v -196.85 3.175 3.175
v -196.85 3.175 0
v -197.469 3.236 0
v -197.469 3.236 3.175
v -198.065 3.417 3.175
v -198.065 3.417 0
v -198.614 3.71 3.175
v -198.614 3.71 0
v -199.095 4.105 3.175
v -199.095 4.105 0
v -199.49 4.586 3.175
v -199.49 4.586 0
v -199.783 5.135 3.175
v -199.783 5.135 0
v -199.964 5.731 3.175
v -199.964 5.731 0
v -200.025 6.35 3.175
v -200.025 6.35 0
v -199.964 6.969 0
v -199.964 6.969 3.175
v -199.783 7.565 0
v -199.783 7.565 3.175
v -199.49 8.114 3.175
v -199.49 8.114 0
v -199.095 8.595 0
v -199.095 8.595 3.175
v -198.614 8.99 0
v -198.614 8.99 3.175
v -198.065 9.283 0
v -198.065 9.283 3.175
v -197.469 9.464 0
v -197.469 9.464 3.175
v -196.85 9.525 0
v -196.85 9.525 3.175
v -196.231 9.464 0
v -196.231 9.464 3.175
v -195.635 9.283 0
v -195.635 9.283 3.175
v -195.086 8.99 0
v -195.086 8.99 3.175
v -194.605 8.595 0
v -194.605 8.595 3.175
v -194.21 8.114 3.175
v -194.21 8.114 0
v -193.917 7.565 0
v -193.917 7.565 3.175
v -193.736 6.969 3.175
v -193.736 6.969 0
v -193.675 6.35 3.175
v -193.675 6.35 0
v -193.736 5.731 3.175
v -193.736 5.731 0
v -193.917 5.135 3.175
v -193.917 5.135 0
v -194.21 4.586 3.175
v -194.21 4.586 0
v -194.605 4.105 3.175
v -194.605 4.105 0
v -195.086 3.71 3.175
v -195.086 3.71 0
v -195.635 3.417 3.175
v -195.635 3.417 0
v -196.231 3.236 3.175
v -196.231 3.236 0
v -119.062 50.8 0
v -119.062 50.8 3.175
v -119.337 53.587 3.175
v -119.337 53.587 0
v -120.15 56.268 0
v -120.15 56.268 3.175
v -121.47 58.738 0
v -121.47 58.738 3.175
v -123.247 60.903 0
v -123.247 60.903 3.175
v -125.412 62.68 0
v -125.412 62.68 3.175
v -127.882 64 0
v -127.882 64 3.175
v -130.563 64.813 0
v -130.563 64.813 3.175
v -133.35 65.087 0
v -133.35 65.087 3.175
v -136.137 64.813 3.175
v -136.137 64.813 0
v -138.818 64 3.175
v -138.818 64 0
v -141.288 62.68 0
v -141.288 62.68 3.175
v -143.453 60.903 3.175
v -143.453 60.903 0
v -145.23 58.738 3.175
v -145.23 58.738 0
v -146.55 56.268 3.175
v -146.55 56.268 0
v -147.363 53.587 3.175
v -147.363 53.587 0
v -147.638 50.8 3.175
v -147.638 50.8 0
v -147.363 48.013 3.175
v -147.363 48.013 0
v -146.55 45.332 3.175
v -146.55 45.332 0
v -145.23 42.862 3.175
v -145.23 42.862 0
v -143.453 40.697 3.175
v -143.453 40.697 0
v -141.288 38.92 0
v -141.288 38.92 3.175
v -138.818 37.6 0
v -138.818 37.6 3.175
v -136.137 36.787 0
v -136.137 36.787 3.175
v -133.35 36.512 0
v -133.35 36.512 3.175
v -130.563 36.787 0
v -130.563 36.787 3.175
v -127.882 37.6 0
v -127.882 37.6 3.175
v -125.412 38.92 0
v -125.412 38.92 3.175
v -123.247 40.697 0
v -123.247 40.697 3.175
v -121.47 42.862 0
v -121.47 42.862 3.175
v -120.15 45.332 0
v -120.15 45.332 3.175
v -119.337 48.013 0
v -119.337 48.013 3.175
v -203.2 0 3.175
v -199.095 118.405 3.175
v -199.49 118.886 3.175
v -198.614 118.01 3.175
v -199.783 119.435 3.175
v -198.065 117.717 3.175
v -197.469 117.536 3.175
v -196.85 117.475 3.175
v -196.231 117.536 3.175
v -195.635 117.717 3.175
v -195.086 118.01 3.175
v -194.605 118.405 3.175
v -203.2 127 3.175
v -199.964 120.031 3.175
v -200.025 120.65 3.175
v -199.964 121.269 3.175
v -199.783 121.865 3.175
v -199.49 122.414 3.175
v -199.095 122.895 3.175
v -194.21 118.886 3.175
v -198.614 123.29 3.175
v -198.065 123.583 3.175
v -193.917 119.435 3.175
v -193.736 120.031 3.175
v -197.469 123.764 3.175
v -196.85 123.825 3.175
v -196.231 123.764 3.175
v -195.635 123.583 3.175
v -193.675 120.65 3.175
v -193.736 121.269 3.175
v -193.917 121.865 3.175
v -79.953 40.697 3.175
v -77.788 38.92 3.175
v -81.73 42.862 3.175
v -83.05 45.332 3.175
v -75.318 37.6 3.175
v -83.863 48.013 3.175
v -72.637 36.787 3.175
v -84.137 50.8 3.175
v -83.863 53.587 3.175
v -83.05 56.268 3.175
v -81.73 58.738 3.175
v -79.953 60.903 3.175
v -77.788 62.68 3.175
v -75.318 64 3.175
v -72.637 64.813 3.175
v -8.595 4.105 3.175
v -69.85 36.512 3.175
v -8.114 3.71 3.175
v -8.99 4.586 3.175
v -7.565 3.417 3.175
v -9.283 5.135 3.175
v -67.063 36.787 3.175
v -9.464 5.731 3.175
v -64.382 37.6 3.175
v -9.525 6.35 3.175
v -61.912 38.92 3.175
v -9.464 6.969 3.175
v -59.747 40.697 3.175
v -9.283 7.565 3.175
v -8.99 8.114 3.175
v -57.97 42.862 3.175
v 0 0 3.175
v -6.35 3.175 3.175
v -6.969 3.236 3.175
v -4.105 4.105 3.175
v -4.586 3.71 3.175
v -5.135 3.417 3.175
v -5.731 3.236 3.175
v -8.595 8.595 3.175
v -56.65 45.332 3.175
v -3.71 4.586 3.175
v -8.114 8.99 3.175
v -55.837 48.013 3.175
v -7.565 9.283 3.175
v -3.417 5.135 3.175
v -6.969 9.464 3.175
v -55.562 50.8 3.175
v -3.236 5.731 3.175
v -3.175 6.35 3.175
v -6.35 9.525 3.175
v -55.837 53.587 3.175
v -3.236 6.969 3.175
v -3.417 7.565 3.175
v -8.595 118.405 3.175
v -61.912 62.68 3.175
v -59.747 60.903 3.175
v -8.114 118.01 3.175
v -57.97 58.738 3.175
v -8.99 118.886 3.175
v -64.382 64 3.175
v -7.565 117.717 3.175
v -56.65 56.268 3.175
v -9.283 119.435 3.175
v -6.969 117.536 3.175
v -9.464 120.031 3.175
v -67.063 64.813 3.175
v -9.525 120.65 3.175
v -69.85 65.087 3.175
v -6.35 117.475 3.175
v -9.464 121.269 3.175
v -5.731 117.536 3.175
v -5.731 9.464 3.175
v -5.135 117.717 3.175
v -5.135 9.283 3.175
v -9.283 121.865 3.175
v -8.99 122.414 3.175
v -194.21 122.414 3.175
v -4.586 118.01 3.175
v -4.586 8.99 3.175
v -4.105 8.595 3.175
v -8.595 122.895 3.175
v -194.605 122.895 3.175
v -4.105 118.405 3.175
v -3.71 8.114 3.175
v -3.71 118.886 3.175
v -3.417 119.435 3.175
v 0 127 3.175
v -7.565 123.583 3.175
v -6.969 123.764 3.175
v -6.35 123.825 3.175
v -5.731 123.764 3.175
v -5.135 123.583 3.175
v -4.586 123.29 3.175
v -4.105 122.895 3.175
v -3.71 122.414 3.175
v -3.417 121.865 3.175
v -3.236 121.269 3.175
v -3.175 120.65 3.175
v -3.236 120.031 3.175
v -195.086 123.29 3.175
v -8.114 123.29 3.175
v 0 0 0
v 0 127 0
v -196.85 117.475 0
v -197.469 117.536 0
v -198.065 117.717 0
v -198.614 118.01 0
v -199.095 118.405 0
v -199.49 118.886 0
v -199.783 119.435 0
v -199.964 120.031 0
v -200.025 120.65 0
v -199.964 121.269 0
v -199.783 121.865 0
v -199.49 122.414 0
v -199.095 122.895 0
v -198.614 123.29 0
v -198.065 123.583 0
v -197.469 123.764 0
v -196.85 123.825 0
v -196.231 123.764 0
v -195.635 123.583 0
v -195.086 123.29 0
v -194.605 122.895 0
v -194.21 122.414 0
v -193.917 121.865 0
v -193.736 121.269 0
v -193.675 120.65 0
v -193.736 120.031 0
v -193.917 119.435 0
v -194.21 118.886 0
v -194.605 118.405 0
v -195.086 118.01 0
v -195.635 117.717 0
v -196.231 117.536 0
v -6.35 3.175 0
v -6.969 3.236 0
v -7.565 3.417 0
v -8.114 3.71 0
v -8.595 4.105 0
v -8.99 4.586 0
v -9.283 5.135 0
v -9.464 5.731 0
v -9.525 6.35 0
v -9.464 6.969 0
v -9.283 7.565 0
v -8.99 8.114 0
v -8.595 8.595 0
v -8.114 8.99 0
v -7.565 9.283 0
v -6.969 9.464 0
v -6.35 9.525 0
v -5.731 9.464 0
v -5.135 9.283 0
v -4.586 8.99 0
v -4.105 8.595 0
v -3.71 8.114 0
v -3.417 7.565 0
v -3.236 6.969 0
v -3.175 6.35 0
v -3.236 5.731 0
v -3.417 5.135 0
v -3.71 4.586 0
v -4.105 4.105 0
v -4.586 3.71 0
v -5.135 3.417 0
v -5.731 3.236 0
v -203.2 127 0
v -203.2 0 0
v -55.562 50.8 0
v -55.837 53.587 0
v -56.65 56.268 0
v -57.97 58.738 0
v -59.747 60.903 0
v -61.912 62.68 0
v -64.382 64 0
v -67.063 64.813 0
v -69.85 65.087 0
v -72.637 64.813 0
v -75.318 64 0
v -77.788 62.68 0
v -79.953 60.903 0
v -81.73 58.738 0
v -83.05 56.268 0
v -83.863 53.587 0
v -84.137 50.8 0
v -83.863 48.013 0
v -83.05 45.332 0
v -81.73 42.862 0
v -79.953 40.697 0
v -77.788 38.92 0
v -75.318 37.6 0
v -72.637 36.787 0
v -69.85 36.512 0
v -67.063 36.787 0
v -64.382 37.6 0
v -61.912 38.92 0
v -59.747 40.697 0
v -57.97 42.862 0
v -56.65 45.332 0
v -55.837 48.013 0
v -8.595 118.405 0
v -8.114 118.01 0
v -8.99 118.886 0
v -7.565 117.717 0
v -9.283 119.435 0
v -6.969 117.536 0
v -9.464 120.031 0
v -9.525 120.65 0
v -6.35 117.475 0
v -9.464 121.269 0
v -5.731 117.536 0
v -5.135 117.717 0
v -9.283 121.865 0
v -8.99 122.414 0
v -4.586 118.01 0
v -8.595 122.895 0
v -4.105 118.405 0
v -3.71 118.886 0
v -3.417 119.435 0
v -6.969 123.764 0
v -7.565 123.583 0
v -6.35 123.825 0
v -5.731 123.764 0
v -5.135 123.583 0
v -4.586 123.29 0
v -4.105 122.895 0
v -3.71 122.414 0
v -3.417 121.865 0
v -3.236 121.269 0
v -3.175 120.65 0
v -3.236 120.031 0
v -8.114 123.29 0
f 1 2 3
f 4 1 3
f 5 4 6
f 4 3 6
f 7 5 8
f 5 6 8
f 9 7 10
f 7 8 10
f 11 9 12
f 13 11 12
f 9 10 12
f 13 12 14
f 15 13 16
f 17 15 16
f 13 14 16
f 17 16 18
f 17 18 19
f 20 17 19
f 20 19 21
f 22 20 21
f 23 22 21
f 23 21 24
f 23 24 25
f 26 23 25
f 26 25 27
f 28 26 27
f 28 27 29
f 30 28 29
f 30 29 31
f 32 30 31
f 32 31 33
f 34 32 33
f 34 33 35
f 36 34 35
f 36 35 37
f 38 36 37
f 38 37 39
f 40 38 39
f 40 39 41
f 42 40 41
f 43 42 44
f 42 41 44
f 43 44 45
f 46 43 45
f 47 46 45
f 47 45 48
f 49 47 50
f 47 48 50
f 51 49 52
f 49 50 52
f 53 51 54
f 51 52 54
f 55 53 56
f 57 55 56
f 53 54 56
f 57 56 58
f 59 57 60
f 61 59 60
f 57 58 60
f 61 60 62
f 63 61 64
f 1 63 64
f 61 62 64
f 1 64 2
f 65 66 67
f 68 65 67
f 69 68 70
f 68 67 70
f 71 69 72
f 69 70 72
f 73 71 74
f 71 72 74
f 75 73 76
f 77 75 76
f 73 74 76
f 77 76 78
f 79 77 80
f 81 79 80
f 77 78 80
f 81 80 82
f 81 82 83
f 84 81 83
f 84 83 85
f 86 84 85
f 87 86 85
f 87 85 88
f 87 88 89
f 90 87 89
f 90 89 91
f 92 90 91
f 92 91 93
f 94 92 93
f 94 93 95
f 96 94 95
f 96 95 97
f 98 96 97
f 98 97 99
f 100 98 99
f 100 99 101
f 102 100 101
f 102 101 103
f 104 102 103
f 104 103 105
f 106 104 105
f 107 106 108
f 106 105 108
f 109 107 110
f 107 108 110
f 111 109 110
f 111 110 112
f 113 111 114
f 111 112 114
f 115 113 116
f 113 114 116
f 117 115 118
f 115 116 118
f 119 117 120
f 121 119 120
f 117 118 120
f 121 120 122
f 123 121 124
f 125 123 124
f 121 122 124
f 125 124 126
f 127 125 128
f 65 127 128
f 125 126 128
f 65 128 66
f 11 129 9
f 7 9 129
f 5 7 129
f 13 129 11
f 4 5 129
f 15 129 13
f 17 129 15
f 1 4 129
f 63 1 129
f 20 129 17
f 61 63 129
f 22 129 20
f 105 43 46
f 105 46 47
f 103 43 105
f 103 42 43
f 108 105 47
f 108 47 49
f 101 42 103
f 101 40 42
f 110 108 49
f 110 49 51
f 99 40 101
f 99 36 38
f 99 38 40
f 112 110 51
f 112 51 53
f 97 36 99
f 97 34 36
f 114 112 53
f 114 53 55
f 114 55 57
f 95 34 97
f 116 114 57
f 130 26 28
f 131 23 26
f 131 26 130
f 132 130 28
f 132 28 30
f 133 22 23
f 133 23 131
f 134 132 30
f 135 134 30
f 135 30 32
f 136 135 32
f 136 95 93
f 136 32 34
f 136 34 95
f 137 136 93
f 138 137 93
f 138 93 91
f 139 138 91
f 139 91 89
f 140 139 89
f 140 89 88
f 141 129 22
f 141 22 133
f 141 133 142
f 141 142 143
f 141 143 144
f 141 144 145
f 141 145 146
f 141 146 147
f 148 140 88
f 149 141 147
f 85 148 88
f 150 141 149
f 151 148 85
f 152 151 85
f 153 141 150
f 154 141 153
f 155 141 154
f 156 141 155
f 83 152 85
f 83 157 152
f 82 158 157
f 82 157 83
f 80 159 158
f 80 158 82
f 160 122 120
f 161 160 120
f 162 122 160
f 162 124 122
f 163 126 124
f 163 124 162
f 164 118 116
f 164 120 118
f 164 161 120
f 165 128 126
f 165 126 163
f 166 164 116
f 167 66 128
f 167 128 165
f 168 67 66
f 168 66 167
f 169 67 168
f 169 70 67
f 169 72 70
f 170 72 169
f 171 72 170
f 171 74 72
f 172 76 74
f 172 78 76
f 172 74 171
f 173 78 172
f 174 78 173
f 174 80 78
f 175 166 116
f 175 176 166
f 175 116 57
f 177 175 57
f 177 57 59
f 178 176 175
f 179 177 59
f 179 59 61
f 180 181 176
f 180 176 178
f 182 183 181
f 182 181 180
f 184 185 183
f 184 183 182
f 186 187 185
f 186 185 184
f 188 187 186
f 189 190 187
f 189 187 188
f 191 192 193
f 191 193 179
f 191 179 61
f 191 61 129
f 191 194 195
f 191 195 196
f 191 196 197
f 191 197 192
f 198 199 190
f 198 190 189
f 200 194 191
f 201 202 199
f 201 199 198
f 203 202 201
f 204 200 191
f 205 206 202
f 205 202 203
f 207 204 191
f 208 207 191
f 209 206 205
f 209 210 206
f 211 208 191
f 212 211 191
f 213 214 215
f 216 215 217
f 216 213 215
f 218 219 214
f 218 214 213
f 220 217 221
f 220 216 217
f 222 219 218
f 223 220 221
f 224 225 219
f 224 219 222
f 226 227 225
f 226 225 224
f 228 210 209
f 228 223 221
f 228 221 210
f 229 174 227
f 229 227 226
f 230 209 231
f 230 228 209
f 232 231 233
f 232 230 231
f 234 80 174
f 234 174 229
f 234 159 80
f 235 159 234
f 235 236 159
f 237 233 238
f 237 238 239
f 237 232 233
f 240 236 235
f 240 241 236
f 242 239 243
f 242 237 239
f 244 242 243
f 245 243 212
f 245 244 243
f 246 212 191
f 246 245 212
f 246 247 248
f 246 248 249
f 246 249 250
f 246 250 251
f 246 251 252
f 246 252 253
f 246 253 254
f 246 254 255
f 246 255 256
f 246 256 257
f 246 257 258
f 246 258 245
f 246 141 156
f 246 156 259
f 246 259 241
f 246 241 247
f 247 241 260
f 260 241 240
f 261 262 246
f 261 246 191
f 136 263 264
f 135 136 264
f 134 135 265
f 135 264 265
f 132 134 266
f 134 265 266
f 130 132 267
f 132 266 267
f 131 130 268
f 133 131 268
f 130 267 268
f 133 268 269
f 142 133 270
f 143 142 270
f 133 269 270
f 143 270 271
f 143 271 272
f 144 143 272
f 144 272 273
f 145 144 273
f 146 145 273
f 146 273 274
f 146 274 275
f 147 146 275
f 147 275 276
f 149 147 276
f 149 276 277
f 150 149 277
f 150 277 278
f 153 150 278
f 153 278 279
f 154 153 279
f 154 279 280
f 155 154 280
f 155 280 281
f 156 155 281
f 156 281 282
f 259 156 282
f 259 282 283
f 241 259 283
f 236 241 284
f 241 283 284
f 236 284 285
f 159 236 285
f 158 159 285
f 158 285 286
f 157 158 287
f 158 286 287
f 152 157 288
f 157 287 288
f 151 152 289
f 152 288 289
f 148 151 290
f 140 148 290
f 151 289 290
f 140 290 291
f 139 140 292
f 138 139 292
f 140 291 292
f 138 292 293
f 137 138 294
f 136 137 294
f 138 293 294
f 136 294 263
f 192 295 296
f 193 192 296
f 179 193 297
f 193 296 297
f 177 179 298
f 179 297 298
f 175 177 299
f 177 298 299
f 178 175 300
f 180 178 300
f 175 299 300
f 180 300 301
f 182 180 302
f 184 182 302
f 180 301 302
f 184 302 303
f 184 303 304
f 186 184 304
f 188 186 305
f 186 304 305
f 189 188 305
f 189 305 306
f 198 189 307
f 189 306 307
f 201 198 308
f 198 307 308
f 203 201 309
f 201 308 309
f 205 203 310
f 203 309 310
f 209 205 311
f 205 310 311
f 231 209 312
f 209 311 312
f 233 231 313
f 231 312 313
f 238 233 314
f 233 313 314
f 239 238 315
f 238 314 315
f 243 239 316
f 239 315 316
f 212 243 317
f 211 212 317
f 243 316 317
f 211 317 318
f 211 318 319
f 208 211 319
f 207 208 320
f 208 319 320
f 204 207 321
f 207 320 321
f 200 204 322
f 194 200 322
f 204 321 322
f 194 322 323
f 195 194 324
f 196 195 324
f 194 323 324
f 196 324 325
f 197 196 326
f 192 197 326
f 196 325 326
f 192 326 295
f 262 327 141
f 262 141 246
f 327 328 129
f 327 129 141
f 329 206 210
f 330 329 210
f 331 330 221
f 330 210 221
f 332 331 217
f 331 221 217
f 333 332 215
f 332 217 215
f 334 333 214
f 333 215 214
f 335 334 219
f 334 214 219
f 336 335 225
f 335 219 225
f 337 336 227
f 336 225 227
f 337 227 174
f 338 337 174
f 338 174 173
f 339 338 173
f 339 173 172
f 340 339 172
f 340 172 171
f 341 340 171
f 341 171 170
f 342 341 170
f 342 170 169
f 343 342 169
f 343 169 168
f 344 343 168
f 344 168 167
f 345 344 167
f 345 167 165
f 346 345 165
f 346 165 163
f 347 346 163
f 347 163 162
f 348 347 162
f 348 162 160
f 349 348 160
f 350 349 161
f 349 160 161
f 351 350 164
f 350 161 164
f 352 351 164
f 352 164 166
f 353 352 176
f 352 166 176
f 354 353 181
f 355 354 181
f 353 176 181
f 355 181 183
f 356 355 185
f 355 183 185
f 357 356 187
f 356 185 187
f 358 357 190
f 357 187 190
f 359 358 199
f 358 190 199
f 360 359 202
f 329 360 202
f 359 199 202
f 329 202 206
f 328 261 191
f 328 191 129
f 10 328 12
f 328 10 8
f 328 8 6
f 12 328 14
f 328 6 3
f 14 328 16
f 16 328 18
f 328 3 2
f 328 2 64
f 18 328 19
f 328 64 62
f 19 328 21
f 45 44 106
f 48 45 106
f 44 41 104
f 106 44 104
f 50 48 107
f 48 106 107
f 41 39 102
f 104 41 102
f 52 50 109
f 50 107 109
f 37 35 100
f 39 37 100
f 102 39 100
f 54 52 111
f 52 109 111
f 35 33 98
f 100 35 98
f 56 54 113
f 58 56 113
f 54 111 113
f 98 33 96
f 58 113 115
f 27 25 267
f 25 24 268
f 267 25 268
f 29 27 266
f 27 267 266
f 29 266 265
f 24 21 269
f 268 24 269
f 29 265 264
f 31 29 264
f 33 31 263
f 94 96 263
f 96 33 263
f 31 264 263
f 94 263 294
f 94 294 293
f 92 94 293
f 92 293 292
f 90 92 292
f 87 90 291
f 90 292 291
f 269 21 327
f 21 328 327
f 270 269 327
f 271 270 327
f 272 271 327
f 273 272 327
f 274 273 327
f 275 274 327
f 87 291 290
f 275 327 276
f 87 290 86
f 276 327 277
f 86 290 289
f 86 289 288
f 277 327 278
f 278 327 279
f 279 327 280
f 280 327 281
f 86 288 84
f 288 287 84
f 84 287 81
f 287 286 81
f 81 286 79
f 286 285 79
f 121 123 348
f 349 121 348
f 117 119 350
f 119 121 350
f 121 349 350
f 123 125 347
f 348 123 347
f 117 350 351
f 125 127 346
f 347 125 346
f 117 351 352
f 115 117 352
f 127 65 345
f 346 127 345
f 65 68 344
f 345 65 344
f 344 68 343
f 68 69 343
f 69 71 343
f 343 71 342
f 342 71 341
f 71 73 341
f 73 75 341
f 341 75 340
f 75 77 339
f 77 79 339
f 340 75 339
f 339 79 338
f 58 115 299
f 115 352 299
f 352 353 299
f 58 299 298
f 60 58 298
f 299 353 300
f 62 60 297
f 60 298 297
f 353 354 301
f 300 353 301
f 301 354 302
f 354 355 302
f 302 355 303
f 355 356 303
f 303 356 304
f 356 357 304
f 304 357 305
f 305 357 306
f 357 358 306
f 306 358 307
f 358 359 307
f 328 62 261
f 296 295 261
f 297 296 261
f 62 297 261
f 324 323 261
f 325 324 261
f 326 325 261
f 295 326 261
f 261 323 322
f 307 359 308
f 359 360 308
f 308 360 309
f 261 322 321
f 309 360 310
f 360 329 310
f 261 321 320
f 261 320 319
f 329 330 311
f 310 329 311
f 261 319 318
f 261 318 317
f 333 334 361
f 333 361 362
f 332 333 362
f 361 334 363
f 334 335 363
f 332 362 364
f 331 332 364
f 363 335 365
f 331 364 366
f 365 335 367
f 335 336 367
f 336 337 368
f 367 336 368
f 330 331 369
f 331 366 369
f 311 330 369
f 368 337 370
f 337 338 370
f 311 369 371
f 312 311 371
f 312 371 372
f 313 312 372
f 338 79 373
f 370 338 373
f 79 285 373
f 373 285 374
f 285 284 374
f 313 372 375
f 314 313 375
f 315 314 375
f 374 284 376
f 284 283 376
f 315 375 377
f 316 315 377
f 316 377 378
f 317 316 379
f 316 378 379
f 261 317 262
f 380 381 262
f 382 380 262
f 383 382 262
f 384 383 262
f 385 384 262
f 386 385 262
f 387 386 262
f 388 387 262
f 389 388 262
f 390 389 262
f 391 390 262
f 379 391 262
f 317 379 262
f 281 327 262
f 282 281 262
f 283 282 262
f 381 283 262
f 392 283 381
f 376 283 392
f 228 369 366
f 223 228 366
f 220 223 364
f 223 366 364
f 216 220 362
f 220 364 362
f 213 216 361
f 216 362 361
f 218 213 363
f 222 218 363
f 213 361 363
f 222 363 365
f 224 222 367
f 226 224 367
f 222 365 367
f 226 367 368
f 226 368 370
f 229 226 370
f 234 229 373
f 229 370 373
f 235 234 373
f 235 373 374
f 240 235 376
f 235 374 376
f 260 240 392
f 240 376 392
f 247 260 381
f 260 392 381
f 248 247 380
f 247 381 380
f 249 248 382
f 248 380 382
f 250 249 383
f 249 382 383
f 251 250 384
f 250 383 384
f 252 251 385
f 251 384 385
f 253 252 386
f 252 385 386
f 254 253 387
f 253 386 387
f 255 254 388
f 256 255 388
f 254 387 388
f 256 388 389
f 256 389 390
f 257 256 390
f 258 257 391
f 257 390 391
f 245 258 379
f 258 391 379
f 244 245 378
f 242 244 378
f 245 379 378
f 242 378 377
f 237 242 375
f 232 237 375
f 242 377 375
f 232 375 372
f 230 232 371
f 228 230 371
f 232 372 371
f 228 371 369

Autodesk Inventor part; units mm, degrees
ref_plane "YZ Plane" through (0, 0, 0) normal (1, 0, 0) x (0, 1, 0)
ref_plane "XZ Plane" through (0, 0, 0) normal (0, 1, 0) x (-1, 0, 0)
sketch "Sketch1" plane through (0, 0, 0) normal (0, 0, 1) x (1, 0, 0)
  line L0 (0, 0) -> (-203.2, 0)
  line L1 (-203.2, 0) -> (-203.2, 127)
  line L2 (-203.2, 127) -> (0, 127)
  line L3 (0, 127) -> (0, 0)
  dimension "d0" = 127
  dimension "d1" = 203.2
extrude "Extrusion1" add sketch "Sketch1" along normal blind 3.175
sketch "Sketch2" plane through (0, 0, 3.175) normal (0, 0, 1) x (1, 0, 0)
  circle A0 centre (-69.85, 50.8) radius 14.2875
  line L0 (0, 0) -> (0, 127) projected
  line L1 (-203.2, 0) -> (0, 0) projected
  circle A1 centre (-133.35, 50.8) radius 14.2875
  line L2 (-101.6, 0) -> (-101.6, 50.8)
  line L3 (-101.6, 50.8) -> (-69.85, 50.8)
  line L4 (-69.85, 50.8) -> (-133.35, 50.8)
  dimension "d4" = 28.575
  dimension "d8" = 28.575
  dimension "d9" = 50.8
  dimension "d28" = 63.5
  dimension "d29" = 31.75
extrude "Extrusion2" cut sketch "Sketch2" against normal blind 3.175
sketch "Sketch3" plane through (0, 0, 3.175) normal (0, 0, 1) x (1, 0, 0)
  circle A0 centre (-6.35, 6.35) radius 3.175
  line L0 (0, 0) -> (0, 127) projected
  line L1 (-203.2, 0) -> (0, 0) projected
  circle A1 centre (-6.35, 120.65) radius 3.175
  line L2 (0, 127) -> (-203.2, 127) projected
  circle A2 centre (-196.85, 120.65) radius 3.175
  circle A3 centre (-196.85, 6.35) radius 3.175
  line L3 (-203.2, 127) -> (-203.2, 0) projected
  dimension "d12" = 6.35
  dimension "d13" = 6.35
  dimension "d14" = 6.35
  dimension "d15" = 6.35
  dimension "d16" = 6.35
  dimension "d17" = 6.35
  dimension "d18" = 6.35
  dimension "d19" = 6.35
  dimension "d20" = 6.35
  dimension "d30" = 6.35
  dimension "d31" = 6.35
  dimension "d32" = 6.35
hole "Hole1" at (-196.85, 120.65, 3.175) at (-196.85, 6.35, 3.175) at (-6.35, 6.35, 3.175) at (-6.35, 120.65, 3.175) direction (0, 0, -1) diameter 6.35 end through all
ref_plane "Work Plane1" through (-101.6, 0, 0) normal (1, 0, 0) x (0, 0, -1)
equation "\"d29\" = 0.5 * d28"
properties part number "Gearbox plate with motor"
